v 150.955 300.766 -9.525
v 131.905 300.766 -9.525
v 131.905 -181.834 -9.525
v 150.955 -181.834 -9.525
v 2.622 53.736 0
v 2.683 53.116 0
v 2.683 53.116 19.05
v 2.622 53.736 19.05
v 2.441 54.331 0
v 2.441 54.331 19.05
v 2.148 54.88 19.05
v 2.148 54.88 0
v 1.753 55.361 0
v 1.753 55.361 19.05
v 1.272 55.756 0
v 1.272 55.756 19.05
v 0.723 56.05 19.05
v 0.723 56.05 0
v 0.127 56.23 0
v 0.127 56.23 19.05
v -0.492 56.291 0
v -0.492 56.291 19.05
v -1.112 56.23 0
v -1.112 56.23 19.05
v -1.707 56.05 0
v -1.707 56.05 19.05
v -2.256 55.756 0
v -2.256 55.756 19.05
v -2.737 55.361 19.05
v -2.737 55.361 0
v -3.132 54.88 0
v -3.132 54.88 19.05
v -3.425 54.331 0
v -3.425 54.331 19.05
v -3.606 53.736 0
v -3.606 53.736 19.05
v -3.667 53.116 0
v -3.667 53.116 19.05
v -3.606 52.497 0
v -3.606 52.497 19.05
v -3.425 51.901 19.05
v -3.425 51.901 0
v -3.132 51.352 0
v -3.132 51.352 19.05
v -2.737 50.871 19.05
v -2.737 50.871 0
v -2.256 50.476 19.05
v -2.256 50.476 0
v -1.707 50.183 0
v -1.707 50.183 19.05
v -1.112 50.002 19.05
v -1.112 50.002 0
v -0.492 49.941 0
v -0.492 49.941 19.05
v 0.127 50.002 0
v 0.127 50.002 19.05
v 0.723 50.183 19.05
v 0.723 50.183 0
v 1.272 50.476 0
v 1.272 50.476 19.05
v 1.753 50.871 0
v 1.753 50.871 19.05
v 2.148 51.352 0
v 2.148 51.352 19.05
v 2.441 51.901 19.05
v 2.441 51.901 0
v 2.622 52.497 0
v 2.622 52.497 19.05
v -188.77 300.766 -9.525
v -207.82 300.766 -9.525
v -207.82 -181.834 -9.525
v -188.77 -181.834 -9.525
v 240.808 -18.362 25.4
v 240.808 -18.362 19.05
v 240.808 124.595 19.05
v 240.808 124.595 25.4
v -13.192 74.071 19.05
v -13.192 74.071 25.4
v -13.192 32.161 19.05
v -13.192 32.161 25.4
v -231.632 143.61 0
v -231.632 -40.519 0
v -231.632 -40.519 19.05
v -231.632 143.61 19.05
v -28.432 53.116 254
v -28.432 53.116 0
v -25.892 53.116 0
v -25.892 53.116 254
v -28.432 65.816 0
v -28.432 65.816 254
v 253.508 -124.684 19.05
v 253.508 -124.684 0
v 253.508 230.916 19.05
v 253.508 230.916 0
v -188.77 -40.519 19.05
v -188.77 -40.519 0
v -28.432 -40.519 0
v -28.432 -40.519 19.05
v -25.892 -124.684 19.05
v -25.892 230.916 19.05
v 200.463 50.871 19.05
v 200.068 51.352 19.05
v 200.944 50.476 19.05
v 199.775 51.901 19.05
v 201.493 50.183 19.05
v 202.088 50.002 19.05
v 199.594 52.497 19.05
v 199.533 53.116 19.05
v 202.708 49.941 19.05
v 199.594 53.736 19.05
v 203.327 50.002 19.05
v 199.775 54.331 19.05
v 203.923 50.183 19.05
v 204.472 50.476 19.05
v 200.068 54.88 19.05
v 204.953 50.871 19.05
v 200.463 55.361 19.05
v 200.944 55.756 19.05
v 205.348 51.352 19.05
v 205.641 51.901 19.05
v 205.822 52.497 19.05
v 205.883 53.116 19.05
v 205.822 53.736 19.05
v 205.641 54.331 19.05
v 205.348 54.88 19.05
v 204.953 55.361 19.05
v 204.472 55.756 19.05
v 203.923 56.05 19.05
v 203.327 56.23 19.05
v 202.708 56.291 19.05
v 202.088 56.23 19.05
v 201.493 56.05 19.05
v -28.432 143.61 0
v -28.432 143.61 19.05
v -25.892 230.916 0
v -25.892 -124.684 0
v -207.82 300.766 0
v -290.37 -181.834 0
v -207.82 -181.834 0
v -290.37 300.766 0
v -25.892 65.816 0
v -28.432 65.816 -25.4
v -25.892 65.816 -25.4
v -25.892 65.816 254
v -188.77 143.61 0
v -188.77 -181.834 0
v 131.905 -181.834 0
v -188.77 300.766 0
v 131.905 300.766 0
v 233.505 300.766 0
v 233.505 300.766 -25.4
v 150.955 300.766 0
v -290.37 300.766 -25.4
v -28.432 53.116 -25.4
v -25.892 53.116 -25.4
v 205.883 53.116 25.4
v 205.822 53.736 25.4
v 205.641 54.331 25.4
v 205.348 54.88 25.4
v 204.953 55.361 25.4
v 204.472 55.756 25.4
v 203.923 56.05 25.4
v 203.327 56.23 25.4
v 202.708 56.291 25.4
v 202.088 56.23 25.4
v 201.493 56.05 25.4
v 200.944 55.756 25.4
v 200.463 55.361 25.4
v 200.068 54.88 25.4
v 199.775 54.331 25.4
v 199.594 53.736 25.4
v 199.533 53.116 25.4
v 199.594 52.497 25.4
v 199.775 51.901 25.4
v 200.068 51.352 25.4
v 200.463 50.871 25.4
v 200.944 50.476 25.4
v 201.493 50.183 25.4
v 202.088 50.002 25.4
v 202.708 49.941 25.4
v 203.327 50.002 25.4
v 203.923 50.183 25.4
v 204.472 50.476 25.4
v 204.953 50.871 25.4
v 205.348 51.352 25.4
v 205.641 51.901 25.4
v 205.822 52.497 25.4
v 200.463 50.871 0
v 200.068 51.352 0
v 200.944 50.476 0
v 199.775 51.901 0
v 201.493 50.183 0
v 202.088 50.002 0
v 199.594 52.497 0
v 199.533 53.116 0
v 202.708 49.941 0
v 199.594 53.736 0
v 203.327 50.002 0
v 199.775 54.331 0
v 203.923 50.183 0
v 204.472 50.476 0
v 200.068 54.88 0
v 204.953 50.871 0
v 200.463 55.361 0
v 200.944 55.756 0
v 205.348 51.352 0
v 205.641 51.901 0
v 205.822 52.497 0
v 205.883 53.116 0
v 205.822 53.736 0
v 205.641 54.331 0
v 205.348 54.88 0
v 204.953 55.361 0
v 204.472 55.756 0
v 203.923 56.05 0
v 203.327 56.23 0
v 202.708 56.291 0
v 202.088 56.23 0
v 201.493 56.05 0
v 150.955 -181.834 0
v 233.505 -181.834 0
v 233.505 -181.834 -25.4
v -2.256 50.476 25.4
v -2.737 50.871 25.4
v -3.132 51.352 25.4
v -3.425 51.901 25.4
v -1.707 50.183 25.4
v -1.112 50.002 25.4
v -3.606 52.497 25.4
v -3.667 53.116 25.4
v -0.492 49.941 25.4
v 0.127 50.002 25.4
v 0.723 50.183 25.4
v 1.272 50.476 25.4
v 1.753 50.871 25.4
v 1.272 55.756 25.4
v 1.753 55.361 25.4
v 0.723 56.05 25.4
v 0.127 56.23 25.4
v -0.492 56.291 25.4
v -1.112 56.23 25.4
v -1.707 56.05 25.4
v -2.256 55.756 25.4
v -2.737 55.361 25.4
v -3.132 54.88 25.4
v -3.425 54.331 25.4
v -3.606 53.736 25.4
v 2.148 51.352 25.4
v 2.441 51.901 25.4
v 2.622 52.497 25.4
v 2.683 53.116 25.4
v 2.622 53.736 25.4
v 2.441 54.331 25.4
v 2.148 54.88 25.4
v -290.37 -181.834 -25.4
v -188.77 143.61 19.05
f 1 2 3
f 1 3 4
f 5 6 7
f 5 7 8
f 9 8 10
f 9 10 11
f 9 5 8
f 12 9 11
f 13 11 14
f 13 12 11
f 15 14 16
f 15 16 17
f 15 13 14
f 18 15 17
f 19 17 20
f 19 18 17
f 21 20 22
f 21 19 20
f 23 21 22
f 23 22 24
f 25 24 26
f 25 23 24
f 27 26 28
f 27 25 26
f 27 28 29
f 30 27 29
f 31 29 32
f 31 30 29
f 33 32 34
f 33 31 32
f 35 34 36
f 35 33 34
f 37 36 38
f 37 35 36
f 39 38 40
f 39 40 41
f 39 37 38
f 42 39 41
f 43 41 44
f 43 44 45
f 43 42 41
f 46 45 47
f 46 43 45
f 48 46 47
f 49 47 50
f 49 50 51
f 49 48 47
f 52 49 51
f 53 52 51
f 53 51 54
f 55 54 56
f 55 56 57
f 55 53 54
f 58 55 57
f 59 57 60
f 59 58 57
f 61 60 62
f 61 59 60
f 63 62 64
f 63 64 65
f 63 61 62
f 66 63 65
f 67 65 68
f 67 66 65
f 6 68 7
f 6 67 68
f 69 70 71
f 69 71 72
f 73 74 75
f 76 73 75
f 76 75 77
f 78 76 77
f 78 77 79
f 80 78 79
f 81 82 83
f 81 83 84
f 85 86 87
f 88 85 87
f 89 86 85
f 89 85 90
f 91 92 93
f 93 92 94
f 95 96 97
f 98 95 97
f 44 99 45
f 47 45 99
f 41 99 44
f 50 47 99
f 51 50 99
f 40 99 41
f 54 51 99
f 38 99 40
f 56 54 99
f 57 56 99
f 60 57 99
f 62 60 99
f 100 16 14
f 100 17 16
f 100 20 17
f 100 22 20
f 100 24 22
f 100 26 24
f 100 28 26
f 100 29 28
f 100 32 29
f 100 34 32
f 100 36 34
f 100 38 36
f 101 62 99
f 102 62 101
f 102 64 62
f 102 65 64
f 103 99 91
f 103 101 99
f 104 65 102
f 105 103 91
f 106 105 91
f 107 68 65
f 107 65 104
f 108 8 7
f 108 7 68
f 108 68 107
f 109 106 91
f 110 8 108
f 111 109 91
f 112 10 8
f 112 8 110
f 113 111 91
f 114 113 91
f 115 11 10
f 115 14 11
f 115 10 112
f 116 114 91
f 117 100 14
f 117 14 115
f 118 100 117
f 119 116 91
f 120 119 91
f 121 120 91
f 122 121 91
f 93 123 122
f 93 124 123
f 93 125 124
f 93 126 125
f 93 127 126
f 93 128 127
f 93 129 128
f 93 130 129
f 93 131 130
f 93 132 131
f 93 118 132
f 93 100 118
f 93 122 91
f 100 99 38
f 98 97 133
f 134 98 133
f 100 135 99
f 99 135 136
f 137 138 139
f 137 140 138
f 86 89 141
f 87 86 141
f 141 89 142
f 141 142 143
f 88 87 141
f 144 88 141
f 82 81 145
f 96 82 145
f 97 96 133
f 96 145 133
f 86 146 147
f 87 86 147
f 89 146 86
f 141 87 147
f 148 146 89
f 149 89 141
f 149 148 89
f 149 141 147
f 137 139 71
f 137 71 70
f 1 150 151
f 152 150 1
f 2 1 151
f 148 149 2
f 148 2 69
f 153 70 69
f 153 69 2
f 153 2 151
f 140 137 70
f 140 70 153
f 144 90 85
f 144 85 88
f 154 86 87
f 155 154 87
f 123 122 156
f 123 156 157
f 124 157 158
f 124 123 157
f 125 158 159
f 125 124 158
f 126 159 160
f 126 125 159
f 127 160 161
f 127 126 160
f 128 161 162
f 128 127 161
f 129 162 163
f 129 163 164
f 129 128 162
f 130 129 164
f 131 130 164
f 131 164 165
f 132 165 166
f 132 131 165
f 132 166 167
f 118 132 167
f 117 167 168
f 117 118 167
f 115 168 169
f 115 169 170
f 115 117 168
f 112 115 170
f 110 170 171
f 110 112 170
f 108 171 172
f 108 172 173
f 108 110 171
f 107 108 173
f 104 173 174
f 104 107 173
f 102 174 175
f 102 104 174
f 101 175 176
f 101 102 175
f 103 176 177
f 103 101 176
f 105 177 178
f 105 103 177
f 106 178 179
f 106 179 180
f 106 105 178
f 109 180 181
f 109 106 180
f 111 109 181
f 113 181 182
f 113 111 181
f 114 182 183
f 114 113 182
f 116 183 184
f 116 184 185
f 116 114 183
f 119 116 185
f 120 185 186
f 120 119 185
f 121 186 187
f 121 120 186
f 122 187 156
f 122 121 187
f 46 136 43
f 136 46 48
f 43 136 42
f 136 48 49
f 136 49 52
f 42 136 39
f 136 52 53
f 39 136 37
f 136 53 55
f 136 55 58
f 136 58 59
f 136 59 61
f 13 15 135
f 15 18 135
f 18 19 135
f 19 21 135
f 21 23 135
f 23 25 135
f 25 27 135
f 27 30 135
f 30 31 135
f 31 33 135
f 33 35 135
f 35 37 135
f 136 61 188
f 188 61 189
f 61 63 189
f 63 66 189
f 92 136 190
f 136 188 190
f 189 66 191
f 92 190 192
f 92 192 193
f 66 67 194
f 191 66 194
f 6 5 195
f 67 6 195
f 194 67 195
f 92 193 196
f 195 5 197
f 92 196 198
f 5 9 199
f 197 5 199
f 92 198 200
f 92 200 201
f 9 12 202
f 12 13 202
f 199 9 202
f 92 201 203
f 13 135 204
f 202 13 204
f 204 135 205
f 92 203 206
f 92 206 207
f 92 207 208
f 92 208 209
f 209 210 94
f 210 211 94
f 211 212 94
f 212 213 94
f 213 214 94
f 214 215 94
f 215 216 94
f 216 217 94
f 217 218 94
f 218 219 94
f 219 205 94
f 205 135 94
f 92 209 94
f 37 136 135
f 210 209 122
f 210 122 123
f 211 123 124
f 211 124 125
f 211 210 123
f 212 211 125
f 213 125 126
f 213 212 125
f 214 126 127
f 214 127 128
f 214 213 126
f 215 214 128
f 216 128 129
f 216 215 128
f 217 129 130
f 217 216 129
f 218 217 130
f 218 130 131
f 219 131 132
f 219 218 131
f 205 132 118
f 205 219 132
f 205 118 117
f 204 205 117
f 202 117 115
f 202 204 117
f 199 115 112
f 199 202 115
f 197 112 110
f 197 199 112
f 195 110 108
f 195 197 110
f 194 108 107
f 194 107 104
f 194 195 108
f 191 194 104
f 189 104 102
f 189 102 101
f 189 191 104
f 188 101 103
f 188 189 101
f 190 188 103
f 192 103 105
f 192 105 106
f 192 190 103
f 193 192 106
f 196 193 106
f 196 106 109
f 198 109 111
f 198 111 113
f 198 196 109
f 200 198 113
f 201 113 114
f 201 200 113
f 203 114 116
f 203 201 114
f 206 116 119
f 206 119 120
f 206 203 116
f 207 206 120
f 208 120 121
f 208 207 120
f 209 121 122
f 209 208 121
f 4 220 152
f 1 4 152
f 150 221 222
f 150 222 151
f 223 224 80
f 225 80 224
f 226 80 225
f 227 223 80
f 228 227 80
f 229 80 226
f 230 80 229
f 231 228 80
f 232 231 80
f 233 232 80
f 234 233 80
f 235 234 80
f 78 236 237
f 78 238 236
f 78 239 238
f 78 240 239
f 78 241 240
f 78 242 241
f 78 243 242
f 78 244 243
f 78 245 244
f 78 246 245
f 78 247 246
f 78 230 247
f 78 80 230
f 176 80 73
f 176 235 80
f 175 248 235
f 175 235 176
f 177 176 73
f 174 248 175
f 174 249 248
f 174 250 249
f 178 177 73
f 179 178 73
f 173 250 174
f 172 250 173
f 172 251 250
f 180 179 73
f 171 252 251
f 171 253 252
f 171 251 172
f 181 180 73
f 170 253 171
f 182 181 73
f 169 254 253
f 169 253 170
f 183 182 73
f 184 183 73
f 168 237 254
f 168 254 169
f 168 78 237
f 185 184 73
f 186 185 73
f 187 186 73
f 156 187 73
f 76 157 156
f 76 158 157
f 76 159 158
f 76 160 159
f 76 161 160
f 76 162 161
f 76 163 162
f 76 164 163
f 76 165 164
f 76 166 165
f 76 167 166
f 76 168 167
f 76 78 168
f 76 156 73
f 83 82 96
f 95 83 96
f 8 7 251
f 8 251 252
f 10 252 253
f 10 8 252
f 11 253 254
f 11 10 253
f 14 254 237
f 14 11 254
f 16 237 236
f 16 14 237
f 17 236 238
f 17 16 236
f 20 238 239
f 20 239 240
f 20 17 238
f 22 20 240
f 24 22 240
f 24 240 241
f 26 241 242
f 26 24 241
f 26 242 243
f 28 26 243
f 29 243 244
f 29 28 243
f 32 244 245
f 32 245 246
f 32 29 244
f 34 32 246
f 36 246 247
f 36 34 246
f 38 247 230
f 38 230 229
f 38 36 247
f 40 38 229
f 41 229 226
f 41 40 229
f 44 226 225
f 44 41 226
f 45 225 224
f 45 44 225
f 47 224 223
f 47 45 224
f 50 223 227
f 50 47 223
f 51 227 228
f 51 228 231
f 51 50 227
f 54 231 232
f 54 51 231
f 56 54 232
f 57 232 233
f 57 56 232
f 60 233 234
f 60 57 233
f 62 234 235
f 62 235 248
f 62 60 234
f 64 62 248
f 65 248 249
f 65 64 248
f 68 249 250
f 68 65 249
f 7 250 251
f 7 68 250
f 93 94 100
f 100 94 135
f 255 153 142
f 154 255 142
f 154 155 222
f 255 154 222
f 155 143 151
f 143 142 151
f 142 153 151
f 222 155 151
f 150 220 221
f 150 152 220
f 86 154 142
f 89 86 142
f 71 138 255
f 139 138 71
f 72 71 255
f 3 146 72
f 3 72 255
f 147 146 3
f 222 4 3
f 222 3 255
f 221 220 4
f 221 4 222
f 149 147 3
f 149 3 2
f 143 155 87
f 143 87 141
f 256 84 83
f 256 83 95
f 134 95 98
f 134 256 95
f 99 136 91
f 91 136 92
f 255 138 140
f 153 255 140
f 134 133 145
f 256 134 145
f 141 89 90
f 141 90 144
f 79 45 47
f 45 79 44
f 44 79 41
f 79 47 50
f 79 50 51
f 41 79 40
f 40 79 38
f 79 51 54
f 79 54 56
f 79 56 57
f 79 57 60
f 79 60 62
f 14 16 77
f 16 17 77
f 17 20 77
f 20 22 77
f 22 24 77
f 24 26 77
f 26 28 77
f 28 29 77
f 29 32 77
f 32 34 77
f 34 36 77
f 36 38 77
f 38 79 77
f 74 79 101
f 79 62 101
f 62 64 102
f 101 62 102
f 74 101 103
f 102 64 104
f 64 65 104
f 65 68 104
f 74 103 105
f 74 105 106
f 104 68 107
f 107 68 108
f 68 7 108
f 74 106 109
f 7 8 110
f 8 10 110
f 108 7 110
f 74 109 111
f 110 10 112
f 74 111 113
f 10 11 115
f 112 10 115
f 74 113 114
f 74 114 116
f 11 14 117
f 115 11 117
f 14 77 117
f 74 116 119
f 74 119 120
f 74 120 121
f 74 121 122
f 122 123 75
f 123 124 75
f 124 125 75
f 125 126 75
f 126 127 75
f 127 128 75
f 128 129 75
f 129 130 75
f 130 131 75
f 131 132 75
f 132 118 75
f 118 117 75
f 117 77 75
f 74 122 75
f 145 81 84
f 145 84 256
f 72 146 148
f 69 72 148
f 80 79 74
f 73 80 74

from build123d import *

# Parameters (mm, degrees)
F0_W     = 82.55
F0_H     = 482.6
F0_W_2   = 320.675
F0_W_3   = 2.54
F0_H_2   = 12.7
F0_W_4   = 19.05
F1_DEPTH = 25.4
F2_DEPTH = 9.525
F3_DEPTH = 254
F4_R     = 3.175
F4_W     = 121.6025
F4_H     = 355.6
F5_DEPTH = 19.05
F4_W_2   = 42.8625
F4_H_2   = 184.129153
F6_DEPTH = 19.05
F7_R     = 3.175
F8_DEPTH = 6.35


with BuildPart() as f1:
    # F0 (on Top) → F1 (new body)
    with BuildSketch(Plane.XY):
        with Locations((192.23037, 59.466296)):
            Rectangle(F0_W, F0_H)
        with Locations((-28.43213, 59.466296)):
            Rectangle(F0_W_2, F0_H)
        with Locations((-27.16213, 59.466296)):
            Rectangle(F0_W_3, F0_H_2, mode=Mode.SUBTRACT)
        with Locations((-249.09463, 59.466296)):
            Rectangle(F0_W, F0_H)
        with Locations((-198.29463, 59.466296)):
            Rectangle(F0_W_4, F0_H)
        with Locations((141.43037, 59.466296)):
            Rectangle(F0_W_4, F0_H)
    extrude(amount=-F1_DEPTH)

    # F0 (on Top) → F2 (cut)
    with BuildSketch(Plane.XY):
        with Locations((-198.29463, 59.466296)):
            Rectangle(F0_W_4, F0_H)
        with Locations((141.43037, 59.466296)):
            Rectangle(F0_W_4, F0_H)
    extrude(amount=-F2_DEPTH, mode=Mode.SUBTRACT)


with BuildPart() as f3:
    # F0 (on Top) → F3 (new body)
    with BuildSketch(Plane.XY):
        with Locations((-27.16213, 59.466296)):
            Rectangle(F0_W_3, F0_H_2)
    extrude(amount=F3_DEPTH)


with BuildPart() as f5:
    # F4 (on face) → F5 (new body)
    with BuildSketch(Plane.XY):
        Polygon((131.90537, 230.916296), (-25.89213, 230.916296), (-25.89213, 65.816296), (-25.89213, 53.116296), (-25.89213, -124.683704), (131.90537, -124.683704), align=None)
        with Locations((-0.49213, 53.116296)):
            Circle(F4_R, mode=Mode.SUBTRACT)
        with Locations((192.70662, 53.116296)):
            Rectangle(F4_W, F4_H)
        with Locations((202.70787, 53.116296)):
            Circle(F4_R, mode=Mode.SUBTRACT)
    extrude(amount=F5_DEPTH)


with BuildPart() as f6:
    # F4 (on face) → F6 (new body)
    with BuildSketch(Plane.XY):
        Polygon((-28.43213, 53.116296), (-28.43213, 65.816296), (-28.43213, 143.610016), (-188.76963, 143.610016), (-188.76963, -40.519137), (-28.43213, -40.519137), align=None)
        with Locations((-210.20088, 51.54544)):
            Rectangle(F4_W_2, F4_H_2)
    extrude(amount=F6_DEPTH)


with BuildPart() as f8:
    # F7 (on face) → F8 (new body)
    with BuildSketch(Plane.XY.offset(19.05)):
        Polygon((240.80787, 124.595038), (-13.19213, 74.071296), (-13.19213, 32.161296), (240.80787, -18.362445), align=None)
        with Locations((-0.49213, 53.116296)):
            Circle(F7_R, mode=Mode.SUBTRACT)
        with Locations((202.70787, 53.116296)):
            Circle(F7_R, mode=Mode.SUBTRACT)
    extrude(amount=F8_DEPTH)


solid = Compound([f1.part, f3.part, f5.part, f6.part, f8.part])
